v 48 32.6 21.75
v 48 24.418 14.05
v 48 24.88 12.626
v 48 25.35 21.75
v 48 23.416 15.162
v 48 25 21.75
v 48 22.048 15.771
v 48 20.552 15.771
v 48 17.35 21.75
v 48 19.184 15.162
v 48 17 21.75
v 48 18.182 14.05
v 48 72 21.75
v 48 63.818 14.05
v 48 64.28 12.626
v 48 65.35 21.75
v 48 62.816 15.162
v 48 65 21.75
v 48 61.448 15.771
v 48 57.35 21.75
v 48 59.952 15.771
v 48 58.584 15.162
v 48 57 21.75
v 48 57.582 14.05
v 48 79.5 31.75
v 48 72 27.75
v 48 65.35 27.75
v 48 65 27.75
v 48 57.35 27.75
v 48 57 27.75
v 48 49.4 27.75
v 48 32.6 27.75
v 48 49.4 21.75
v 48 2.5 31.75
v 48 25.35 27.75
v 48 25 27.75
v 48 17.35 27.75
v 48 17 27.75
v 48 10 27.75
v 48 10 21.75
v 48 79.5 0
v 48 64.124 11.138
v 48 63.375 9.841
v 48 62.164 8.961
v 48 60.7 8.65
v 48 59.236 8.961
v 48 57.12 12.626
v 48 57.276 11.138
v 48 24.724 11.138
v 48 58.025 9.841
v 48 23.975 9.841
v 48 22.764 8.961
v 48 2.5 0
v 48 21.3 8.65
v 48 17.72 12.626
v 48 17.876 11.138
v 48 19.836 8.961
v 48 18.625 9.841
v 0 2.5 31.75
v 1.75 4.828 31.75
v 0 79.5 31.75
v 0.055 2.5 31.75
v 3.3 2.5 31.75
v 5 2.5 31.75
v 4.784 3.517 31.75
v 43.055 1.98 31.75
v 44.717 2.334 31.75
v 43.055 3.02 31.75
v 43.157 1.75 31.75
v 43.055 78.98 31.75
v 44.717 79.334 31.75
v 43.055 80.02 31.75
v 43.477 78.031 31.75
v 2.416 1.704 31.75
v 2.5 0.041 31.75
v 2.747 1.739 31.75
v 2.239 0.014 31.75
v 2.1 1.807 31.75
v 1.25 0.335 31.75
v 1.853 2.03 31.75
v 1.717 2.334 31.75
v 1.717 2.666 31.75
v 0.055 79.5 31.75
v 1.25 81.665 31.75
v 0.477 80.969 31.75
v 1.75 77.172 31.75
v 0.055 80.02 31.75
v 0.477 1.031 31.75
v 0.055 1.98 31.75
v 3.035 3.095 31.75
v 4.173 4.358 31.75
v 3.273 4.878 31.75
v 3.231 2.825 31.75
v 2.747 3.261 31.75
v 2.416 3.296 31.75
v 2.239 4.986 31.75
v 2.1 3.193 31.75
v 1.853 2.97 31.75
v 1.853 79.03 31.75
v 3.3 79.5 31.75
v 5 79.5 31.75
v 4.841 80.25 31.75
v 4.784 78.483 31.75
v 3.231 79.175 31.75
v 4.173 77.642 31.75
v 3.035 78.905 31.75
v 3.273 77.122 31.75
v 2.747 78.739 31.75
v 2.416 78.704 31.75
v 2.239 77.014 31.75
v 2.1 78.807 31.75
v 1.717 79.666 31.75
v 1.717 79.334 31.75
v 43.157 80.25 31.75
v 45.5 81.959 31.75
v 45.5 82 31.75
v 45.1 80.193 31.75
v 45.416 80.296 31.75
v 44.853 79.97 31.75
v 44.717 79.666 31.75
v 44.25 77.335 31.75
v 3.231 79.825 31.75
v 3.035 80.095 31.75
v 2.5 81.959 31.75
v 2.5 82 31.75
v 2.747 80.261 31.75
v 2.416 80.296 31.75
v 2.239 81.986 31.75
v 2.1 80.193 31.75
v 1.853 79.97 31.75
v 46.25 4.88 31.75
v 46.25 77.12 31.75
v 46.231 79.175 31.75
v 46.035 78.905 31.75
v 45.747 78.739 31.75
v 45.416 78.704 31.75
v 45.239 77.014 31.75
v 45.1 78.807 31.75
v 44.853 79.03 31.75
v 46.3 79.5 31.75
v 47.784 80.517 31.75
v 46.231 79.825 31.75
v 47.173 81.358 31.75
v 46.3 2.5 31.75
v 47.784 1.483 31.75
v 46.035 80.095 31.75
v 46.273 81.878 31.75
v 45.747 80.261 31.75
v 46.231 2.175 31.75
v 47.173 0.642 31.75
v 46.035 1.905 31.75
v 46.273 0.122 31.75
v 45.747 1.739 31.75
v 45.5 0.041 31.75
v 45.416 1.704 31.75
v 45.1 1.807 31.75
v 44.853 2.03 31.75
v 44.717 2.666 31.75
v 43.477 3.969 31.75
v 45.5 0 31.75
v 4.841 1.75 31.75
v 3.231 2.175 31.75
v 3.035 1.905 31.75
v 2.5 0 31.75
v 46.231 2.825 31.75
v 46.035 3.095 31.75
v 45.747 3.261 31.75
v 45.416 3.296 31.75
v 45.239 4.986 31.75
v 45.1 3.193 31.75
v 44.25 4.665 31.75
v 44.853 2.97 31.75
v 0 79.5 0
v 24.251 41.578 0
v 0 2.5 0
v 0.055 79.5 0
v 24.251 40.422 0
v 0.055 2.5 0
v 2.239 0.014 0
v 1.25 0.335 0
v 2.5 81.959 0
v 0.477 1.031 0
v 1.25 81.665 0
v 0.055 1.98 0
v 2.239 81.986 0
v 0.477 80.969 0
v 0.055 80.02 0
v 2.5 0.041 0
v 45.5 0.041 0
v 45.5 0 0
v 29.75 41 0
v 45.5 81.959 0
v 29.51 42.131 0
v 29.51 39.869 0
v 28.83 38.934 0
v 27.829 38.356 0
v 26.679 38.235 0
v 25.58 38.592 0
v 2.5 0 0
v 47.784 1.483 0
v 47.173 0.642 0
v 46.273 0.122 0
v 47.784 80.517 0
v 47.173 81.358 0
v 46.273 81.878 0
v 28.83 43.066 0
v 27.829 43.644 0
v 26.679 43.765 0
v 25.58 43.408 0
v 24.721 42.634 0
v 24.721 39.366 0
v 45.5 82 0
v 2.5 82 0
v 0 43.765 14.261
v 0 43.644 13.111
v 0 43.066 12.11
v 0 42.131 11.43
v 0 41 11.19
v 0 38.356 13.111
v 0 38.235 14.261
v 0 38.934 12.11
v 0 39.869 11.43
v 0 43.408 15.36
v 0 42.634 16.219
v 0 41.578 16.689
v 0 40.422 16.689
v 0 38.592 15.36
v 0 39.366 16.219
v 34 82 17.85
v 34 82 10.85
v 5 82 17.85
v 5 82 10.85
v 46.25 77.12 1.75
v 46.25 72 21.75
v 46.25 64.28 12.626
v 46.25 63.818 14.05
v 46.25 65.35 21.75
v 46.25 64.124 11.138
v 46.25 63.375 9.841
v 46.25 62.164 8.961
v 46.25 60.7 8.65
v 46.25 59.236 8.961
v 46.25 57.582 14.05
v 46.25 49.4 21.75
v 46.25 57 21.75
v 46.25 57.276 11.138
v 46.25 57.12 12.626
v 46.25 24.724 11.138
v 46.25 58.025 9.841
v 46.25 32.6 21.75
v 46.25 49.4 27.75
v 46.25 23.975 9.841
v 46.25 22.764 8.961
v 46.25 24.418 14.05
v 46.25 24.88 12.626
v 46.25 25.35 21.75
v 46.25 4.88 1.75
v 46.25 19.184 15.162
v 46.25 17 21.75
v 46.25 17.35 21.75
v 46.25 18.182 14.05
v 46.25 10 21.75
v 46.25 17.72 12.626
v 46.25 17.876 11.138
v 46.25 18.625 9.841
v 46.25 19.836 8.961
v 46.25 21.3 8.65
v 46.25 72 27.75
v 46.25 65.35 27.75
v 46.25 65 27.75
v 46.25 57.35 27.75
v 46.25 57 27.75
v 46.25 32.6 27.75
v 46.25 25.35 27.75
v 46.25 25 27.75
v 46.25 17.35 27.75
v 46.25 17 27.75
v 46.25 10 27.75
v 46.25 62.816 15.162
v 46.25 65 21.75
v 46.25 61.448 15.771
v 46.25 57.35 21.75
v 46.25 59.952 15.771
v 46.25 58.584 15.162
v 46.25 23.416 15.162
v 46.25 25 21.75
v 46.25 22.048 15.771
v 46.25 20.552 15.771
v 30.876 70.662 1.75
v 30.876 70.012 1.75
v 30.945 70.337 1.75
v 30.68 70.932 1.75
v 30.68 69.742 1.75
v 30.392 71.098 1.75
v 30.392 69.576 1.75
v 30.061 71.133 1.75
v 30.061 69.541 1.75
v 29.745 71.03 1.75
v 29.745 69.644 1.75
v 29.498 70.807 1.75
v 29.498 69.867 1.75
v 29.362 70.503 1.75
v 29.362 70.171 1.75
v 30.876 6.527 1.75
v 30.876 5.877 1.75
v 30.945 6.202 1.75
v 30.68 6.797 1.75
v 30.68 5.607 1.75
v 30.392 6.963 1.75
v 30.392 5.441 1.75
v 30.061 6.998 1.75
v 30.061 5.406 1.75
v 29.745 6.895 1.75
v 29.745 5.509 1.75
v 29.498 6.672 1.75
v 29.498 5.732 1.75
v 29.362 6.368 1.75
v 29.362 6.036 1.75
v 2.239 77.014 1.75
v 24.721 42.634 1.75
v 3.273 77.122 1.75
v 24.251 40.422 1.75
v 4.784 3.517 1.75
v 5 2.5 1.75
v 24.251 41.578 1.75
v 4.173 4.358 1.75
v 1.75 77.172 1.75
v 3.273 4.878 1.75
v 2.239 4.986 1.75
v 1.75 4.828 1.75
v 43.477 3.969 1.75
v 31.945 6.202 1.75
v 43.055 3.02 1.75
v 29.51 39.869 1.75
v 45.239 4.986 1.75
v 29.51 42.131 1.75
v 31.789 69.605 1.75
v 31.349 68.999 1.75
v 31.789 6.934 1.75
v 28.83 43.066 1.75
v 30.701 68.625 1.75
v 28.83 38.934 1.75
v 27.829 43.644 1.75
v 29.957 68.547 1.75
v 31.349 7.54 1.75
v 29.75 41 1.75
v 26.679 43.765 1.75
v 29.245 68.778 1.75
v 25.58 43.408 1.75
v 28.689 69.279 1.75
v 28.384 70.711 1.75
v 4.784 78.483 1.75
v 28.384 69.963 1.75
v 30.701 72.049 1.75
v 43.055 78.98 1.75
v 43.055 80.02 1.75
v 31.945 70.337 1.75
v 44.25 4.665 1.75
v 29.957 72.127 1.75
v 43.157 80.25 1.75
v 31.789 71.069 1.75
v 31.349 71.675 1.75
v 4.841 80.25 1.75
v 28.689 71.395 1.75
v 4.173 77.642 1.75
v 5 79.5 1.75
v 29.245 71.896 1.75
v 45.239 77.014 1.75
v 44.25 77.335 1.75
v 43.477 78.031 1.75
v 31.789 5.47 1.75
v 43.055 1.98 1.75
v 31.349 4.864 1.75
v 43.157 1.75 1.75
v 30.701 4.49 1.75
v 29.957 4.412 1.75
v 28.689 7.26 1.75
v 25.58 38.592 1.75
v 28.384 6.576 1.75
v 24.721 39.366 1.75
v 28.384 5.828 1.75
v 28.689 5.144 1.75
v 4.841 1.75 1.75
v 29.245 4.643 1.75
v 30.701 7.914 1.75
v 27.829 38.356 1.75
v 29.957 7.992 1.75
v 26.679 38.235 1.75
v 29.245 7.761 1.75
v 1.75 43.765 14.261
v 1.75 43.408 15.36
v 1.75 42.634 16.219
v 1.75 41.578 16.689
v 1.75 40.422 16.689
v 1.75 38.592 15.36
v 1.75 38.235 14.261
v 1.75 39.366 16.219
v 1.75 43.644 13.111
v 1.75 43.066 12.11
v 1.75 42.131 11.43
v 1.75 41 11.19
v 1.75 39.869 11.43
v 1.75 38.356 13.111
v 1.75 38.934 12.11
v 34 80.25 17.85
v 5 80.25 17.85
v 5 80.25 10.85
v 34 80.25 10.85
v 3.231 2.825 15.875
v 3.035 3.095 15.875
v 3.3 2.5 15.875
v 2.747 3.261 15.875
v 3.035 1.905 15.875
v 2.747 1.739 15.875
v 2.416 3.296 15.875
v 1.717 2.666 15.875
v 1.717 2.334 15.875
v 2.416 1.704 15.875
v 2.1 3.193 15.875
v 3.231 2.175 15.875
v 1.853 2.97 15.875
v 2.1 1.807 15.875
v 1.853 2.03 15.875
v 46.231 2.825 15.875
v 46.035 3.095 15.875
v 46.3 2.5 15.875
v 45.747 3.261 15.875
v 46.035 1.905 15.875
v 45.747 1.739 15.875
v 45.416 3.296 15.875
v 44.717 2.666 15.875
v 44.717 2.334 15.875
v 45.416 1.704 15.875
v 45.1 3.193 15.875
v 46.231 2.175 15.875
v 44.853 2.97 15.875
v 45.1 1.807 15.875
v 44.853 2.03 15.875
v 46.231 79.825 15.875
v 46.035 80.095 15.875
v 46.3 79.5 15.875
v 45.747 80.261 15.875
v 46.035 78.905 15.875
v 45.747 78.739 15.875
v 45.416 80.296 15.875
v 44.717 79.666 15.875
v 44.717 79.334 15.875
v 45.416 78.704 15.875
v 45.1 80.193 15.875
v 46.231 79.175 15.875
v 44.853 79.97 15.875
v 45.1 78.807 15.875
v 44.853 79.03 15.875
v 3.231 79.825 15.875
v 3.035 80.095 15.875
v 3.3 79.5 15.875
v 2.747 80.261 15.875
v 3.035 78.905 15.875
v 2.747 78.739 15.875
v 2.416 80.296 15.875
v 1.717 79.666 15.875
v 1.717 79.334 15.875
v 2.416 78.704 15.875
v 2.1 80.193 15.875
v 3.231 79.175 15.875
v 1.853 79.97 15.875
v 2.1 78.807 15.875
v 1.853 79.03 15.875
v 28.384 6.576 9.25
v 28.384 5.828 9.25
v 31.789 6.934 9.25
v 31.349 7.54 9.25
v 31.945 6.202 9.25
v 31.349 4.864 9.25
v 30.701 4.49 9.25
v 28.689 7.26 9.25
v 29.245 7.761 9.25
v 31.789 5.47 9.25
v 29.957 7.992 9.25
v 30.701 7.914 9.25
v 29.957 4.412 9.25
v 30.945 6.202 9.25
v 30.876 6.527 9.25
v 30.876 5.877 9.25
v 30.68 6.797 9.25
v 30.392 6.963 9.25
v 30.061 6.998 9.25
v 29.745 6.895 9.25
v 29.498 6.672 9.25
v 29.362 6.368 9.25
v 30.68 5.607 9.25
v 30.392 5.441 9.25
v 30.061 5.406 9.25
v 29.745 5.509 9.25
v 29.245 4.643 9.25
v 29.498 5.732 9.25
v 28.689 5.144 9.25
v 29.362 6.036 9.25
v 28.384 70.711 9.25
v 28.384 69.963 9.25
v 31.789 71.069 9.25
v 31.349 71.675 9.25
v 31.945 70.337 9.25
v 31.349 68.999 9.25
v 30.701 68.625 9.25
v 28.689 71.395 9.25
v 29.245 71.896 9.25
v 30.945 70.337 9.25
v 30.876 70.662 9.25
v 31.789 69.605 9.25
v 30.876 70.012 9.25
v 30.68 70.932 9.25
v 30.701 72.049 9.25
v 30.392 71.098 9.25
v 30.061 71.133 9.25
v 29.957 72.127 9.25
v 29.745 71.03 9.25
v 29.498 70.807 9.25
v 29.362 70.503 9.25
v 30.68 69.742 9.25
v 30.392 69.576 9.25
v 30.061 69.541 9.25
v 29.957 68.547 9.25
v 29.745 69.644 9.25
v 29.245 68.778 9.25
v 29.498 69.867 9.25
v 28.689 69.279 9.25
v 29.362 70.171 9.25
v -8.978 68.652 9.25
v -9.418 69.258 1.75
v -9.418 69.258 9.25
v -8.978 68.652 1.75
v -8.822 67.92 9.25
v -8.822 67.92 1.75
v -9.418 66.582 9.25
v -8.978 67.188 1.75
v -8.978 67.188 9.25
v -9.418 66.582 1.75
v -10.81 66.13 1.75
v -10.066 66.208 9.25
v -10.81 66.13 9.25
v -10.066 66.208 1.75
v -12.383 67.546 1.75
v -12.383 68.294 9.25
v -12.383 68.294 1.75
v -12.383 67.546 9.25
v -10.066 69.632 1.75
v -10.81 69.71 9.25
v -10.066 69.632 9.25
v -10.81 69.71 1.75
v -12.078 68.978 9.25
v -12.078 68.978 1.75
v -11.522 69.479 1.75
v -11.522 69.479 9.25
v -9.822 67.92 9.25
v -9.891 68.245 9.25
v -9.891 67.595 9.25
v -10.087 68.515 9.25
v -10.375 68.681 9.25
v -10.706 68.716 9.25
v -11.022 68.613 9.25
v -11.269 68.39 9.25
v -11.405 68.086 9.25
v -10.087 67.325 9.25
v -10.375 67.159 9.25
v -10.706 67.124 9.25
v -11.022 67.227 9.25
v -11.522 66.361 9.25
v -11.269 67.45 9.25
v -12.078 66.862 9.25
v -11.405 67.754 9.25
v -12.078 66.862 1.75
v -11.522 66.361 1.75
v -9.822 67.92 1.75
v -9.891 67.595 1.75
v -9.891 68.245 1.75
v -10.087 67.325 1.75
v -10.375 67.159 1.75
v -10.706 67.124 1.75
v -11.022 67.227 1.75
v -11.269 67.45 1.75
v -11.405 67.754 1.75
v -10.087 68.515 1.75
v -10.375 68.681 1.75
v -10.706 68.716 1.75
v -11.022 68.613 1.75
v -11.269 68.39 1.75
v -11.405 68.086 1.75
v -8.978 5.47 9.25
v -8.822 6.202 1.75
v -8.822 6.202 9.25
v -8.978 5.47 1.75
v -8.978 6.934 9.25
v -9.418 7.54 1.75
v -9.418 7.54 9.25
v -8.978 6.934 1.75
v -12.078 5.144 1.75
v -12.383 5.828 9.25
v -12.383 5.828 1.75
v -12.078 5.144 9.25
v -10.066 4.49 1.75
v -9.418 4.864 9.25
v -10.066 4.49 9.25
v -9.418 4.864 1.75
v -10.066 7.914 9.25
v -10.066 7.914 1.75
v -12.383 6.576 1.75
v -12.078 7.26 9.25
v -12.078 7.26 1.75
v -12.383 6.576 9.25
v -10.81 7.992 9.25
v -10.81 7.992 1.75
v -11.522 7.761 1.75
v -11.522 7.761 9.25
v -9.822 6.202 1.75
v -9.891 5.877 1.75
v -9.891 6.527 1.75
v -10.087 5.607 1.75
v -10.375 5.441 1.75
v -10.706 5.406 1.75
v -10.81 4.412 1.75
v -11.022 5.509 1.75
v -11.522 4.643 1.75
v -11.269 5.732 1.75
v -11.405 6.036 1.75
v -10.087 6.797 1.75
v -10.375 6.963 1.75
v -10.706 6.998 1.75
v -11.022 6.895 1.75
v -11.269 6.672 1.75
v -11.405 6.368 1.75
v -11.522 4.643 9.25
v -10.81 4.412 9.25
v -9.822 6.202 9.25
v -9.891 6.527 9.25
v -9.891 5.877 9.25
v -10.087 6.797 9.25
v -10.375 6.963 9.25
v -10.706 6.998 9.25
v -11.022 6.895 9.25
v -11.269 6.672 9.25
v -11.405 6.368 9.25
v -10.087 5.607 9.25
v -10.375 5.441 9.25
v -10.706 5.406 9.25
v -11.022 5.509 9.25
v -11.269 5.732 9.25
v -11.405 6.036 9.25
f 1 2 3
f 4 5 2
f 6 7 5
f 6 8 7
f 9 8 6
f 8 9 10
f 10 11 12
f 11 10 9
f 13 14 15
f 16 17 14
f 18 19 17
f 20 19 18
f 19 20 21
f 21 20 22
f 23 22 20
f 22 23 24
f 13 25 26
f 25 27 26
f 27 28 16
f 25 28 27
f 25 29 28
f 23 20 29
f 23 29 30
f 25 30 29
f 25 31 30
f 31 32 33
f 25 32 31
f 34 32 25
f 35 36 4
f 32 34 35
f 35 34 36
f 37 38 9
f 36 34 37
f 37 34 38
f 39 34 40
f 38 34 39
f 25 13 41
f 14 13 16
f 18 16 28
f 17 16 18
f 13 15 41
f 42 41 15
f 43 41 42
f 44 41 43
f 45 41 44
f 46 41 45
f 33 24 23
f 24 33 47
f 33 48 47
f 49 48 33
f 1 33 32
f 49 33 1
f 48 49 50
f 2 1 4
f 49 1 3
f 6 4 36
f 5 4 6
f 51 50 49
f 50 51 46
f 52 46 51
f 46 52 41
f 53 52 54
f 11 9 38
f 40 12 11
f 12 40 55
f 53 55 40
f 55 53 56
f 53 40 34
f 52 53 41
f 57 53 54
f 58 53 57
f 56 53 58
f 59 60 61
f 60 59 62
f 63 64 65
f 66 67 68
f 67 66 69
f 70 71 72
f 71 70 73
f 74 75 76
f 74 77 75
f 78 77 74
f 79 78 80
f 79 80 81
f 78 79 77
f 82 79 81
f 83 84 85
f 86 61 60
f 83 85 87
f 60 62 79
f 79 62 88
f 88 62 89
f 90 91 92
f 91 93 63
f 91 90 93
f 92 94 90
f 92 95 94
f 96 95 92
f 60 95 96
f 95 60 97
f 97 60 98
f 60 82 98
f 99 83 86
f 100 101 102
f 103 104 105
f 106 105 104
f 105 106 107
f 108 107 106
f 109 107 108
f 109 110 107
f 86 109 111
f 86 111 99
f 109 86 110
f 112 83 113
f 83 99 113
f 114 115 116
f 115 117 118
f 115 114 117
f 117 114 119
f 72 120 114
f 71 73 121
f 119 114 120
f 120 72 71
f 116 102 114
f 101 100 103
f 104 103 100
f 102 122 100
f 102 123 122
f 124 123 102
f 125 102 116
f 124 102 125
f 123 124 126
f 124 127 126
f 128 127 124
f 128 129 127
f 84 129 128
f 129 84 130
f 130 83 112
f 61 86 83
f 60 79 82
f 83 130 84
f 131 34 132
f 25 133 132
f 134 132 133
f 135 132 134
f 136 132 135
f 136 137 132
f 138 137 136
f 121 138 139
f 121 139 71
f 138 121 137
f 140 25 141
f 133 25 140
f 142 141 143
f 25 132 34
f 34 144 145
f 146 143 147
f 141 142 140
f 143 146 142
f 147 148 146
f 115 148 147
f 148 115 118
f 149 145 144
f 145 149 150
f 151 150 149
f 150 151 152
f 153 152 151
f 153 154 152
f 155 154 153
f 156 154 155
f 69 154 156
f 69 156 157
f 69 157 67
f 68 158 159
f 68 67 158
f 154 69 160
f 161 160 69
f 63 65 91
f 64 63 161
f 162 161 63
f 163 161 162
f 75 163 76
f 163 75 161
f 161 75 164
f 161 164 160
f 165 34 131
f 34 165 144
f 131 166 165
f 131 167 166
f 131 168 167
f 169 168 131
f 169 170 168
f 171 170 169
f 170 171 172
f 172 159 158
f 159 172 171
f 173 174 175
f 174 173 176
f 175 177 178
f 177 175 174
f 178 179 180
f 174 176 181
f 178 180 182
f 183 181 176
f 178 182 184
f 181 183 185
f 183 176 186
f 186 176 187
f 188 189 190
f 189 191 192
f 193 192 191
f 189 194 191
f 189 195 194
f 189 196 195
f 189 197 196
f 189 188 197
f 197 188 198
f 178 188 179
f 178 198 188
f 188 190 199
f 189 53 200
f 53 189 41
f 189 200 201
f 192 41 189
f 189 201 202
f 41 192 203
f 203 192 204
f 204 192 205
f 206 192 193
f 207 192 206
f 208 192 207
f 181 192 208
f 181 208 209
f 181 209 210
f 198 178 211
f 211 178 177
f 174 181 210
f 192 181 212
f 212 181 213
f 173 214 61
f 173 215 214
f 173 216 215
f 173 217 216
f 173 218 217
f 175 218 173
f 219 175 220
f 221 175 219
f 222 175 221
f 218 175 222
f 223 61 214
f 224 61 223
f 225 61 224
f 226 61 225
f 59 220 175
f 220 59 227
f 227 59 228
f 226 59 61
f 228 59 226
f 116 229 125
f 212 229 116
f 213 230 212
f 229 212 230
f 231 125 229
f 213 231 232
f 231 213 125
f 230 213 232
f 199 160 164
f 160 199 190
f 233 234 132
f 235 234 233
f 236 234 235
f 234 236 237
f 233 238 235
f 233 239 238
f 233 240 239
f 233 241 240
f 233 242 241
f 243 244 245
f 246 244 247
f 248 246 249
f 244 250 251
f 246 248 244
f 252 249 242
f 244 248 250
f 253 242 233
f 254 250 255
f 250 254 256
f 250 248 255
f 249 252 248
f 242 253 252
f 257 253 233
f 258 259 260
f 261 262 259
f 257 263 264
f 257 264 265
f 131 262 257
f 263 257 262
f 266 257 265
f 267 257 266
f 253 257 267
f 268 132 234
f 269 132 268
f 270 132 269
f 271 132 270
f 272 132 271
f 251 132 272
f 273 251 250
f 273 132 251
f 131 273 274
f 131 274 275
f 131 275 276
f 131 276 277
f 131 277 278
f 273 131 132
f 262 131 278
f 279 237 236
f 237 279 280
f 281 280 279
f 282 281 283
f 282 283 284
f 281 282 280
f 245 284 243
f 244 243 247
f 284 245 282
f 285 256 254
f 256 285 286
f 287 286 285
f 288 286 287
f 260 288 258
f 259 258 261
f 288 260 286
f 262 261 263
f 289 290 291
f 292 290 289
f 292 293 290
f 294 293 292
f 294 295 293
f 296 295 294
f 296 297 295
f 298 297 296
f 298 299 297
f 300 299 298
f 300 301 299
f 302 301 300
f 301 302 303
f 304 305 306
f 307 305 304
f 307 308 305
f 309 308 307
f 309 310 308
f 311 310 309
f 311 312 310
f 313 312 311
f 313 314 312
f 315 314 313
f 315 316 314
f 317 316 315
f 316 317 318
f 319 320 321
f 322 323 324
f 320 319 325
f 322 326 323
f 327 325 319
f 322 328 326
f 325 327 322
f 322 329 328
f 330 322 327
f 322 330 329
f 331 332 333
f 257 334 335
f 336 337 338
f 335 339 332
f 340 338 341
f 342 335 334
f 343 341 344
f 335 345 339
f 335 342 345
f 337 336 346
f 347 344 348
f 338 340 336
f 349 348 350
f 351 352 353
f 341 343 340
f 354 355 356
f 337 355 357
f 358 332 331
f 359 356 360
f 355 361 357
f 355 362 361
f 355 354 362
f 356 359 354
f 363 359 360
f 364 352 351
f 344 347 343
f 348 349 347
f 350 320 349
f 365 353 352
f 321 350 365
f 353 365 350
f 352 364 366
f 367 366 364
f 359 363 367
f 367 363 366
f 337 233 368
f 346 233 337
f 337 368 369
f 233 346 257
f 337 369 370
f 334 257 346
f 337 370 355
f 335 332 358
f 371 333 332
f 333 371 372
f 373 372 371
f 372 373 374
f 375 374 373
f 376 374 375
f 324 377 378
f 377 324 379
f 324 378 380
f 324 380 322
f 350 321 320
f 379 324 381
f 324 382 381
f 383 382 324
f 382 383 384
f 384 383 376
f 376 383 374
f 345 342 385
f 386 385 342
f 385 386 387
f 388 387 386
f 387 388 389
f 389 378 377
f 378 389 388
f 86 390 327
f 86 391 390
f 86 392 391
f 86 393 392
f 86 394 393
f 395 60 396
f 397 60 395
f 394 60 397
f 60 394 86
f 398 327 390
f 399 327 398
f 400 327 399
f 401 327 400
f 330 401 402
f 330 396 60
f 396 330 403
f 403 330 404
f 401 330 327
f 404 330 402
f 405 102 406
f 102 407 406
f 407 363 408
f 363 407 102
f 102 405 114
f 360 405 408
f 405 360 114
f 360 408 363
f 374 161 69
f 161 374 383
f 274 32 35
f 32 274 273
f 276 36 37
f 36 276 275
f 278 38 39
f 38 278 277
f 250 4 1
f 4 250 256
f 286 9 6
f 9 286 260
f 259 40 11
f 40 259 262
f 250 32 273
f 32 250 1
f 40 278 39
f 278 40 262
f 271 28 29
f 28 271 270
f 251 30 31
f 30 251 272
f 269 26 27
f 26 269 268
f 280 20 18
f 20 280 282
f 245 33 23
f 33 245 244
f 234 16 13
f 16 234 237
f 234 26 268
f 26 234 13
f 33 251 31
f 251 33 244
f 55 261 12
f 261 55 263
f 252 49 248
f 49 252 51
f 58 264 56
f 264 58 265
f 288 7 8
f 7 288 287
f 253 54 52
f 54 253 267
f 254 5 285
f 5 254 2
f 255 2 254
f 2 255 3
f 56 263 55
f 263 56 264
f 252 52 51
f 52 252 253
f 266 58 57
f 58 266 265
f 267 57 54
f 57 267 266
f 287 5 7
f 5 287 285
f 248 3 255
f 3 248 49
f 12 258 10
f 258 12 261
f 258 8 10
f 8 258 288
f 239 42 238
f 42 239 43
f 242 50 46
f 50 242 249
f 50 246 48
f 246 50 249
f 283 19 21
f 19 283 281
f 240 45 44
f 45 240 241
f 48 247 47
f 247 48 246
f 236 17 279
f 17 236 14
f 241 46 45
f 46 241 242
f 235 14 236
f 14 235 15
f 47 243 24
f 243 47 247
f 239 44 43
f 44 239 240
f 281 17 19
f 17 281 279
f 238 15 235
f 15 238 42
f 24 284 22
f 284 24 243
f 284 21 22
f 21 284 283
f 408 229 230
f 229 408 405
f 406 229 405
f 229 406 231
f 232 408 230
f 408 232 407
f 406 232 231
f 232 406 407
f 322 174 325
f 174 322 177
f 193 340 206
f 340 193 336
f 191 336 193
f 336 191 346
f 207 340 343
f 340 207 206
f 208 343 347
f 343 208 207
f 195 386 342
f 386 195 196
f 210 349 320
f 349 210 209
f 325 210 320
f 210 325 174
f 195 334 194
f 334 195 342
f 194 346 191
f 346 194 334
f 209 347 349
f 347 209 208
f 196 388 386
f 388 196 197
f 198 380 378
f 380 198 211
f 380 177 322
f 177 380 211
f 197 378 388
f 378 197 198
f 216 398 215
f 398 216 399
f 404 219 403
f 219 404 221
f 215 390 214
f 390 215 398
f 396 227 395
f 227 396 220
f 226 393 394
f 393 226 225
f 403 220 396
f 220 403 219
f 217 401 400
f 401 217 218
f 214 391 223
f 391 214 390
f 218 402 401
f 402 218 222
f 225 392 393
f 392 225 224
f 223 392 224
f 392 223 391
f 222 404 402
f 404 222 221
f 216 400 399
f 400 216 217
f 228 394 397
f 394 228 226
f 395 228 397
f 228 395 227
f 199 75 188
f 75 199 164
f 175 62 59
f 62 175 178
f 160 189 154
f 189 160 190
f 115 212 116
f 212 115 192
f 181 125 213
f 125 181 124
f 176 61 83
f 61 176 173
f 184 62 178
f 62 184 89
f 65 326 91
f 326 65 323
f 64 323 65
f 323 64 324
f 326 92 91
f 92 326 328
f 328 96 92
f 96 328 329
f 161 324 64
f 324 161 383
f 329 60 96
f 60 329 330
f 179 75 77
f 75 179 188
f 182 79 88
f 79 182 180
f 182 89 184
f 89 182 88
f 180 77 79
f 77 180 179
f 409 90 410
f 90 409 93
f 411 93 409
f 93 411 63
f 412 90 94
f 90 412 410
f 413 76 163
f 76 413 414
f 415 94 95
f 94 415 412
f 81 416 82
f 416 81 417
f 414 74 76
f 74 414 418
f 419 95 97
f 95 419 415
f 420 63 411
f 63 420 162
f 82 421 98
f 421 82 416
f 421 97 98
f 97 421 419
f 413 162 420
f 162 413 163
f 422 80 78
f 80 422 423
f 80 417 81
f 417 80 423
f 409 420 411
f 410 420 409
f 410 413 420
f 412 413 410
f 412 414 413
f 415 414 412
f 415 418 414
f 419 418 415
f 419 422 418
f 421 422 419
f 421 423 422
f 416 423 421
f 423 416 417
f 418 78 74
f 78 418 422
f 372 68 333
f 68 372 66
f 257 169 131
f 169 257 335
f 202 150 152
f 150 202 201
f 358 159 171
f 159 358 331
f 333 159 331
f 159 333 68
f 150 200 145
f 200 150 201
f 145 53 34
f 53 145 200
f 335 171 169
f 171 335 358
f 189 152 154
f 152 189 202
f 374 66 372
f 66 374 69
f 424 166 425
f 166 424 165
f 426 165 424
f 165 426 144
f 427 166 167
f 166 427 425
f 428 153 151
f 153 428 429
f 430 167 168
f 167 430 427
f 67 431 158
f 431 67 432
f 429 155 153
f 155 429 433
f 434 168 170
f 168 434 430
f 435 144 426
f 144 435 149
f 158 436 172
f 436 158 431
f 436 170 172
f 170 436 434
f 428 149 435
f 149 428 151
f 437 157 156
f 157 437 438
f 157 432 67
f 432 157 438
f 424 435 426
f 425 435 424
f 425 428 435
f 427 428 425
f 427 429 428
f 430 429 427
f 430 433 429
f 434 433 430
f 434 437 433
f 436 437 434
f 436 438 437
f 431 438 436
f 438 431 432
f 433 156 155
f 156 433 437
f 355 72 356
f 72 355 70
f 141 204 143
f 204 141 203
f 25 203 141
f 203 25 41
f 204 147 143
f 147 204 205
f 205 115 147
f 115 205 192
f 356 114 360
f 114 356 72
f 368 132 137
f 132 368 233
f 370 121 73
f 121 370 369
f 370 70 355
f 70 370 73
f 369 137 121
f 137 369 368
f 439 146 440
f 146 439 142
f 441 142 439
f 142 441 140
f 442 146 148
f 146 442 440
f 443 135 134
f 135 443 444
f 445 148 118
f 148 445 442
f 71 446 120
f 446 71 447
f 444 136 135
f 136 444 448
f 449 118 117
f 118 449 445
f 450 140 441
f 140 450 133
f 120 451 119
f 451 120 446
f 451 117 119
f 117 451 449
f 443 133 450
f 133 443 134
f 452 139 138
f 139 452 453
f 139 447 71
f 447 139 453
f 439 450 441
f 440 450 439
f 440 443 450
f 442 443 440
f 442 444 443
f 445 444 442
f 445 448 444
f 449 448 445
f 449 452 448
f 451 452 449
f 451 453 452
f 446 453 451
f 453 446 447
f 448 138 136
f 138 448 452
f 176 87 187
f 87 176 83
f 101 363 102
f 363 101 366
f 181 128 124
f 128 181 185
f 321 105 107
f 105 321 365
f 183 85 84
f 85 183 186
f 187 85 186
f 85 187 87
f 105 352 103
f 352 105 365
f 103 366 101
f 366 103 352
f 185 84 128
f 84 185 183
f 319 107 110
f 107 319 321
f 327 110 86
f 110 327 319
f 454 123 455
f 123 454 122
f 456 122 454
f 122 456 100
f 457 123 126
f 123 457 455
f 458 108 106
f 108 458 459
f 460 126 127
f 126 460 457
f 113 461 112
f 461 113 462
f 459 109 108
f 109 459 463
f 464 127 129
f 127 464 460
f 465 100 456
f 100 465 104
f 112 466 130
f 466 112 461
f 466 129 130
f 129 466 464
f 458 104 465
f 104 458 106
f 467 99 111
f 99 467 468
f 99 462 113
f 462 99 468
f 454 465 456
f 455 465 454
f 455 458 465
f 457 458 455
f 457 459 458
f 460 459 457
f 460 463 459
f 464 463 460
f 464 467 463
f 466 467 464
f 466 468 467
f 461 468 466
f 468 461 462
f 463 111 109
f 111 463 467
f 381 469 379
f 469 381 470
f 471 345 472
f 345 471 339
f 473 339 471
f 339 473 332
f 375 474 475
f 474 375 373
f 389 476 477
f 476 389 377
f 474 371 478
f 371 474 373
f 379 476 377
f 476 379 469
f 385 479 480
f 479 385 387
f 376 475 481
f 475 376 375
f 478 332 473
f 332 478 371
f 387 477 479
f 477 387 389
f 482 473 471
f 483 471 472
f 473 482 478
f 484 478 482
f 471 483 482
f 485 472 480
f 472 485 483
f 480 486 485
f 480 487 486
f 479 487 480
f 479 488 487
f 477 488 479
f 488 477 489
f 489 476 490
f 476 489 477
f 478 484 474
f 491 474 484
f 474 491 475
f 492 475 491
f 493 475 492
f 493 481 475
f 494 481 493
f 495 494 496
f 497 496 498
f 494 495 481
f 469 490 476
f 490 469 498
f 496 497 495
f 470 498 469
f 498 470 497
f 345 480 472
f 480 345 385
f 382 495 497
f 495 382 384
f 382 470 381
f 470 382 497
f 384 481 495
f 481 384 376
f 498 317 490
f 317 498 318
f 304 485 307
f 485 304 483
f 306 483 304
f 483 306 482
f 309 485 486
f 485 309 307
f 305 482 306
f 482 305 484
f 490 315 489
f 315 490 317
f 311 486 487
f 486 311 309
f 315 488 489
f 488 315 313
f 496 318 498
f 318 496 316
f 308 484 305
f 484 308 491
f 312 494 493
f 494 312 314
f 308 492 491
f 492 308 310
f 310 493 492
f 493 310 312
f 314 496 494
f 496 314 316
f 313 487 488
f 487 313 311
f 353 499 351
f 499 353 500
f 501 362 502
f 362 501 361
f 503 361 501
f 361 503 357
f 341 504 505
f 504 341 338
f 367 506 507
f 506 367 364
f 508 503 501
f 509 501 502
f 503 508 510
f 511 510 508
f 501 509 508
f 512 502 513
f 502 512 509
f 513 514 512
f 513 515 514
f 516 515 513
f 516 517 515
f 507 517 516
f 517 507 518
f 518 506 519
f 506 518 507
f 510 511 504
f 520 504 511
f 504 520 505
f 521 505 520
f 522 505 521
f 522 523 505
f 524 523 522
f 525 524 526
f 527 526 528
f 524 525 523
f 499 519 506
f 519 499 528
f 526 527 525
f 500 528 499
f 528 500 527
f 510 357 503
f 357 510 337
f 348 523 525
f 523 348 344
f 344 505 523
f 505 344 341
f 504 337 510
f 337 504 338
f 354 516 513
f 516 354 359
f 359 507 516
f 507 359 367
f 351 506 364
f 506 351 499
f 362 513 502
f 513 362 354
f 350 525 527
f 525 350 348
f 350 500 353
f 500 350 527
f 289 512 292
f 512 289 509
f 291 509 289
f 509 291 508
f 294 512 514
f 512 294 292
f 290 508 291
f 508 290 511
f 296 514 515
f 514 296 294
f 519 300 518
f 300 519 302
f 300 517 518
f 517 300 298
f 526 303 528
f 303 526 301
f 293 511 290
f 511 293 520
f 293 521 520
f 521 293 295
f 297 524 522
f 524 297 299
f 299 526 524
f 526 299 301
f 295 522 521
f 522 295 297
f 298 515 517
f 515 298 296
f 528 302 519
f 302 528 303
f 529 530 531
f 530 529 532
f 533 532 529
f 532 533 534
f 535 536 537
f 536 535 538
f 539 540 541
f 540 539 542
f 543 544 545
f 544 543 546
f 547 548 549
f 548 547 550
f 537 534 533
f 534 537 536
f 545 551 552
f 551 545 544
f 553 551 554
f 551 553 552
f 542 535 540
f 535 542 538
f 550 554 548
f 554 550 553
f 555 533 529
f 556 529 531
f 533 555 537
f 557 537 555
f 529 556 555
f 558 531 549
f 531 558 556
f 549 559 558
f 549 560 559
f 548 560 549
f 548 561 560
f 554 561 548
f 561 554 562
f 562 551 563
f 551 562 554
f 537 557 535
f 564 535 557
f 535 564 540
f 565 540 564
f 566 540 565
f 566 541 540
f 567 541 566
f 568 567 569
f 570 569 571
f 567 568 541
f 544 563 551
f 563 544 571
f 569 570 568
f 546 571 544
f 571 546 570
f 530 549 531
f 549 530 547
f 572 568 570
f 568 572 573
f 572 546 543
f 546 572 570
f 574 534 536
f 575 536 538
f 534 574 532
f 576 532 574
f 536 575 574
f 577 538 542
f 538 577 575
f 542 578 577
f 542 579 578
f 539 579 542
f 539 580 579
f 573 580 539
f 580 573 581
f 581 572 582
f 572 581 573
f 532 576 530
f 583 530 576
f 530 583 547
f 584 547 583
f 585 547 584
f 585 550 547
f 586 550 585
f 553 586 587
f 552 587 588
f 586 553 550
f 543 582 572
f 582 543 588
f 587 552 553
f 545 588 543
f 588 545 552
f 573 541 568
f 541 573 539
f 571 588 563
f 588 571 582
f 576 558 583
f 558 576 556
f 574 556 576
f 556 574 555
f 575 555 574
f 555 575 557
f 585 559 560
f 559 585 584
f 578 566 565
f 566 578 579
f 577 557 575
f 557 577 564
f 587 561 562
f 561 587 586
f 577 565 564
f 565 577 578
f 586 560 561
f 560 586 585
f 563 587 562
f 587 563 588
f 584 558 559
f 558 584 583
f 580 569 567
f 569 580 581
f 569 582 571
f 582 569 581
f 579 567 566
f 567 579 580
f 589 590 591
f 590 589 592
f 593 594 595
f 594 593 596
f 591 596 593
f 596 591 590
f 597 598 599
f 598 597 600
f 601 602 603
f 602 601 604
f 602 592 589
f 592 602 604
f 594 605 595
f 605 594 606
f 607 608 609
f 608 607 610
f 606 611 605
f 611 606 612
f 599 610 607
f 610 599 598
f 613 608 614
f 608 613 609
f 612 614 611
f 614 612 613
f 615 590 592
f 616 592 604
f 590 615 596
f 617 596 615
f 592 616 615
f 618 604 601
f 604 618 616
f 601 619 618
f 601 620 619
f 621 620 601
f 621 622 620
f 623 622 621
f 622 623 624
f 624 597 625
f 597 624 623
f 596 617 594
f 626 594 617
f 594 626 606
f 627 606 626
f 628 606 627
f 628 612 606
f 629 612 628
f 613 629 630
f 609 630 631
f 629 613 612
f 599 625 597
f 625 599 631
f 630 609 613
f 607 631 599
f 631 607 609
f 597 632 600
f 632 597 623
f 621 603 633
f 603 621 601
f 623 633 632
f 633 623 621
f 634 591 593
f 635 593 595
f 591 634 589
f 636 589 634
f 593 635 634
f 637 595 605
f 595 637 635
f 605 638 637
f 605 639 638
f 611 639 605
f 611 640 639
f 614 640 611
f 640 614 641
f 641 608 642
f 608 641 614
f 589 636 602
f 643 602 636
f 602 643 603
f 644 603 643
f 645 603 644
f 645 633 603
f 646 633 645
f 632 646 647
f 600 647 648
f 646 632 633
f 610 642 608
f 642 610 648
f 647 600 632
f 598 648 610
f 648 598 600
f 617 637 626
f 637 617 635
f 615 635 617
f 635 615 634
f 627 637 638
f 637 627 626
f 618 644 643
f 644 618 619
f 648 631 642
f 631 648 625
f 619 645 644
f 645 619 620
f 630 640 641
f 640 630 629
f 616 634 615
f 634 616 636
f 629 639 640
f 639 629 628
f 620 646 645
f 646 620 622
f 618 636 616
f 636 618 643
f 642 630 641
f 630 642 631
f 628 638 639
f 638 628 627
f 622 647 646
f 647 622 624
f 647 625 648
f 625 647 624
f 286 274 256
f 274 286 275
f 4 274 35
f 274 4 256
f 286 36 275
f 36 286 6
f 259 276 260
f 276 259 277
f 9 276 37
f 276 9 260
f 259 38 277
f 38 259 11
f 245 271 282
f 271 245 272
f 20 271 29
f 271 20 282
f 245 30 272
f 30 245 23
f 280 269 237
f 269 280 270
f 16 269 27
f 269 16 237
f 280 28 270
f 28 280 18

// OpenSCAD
//everything is in units of millimeters
resolution = 0.35;

//variables to keep in-sync with the other scad file
mainShellThickness = 5 * resolution;
mainDepth = 48;
mainWidth = 82;
mainHeight = 30 + mainShellThickness;
screwCylinderRadius = 2.5;
screwHoleCylinderRadius = 0.8;
screwHoleCylinderOffsetFromFloor = mainHeight / 2;
cylinderFragments = 15; //TODO 70;

displayWidth = 22.6;
displayDepth = mainShellThickness;
displayHeight = 6;
displayYOffset = 8.4;
displayTopOffset = displayHeight + 4;
knobHoleYoffset = (mainWidth / 2) - displayYOffset - (displayWidth / 2);
knobHoleZoffset = mainHeight - displayTopOffset - 9.5;
knobHoleRadius = 3.6;
knobHoleDepth = mainShellThickness;
knobScrewHoleYoffset = 9;
knobScrewBottomHoleZoffset = 6;
knobScrewTopHoleZoffset = 11;
knobScrewHoleRadius = 1.6;
knobSupportWallThickness = resolution * 2;
knobSupportWidth = 12 + 2 * knobSupportWallThickness;
knobSupportHeight = 12.3 + 2 * knobSupportWallThickness;
knobSupportDepth = 2;
mountingHoleRadius = 2.78;
mountingHoleX = mainDepth - mainShellThickness - mountingHoleRadius - 16.5;
pcbScrewMountHeight = 7.5;
pcbScrewCylinderRadius = 1.8;
pcbScrewHoleCylinderRadius = 0.8;
pcbBoardThickness = 1.6;
pcbOffsetFromFront = 19;
usbSlotWidth = 29;
usbSlotHeight = 7;
usbSlotYoffset = pcbScrewMountHeight + pcbBoardThickness;


union() {
  difference() {
    //main shell
    cube([mainDepth, mainWidth, mainHeight]);
    translate([mainShellThickness, mainShellThickness, mainShellThickness]) {//cut-out inside
      cube([mainDepth - mainShellThickness * 2, mainWidth - mainShellThickness * 2, mainHeight]);
    };
    
    //left display
    translate([mainDepth - displayDepth, mainWidth/2 - displayWidth - displayYOffset, mainHeight - displayTopOffset]) {
      cube([displayDepth,displayWidth,displayHeight]);
    };
    
    //right display
    translate([mainDepth - displayDepth, mainWidth/2 + displayYOffset, mainHeight - displayTopOffset]) {
      cube([displayDepth,displayWidth,displayHeight]);
    };
    
    //left knob
    translate([mainDepth - knobHoleDepth, knobHoleYoffset, knobHoleZoffset]) {
      rotate([0,90,0]) {
        cylinder(knobHoleDepth,knobHoleRadius,knobHoleRadius,$fn=cylinderFragments);
      };
    };
    
    //right knob
    translate([mainDepth - knobHoleDepth, mainWidth - knobHoleYoffset, knobHoleZoffset]) {
      rotate([0,90,0]) {
        cylinder(knobHoleDepth,knobHoleRadius,knobHoleRadius,$fn=cylinderFragments);
      };
    };
    
    //usb cable slot right side
    translate([screwCylinderRadius * 2, mainWidth - mainShellThickness, mainShellThickness + usbSlotYoffset]) {
      cube([usbSlotWidth, mainShellThickness, usbSlotHeight]);
    };
    
    //bottom mounting hole
    translate([mountingHoleX, mainWidth/2, 0]) {
      cylinder(mainShellThickness, mountingHoleRadius, mountingHoleRadius, $fn=cylinderFragments);
    };
    
    //back mounting hole
    translate([0, mainWidth/2, mainHeight - mountingHoleRadius - 15]) {
      rotate([0,90,0]) {
        cylinder(mainShellThickness, mountingHoleRadius, mountingHoleRadius, $fn=cylinderFragments);
      };
    };
    
    //cut out for case lid screw mounts and rounded edges, rear-left
    translate([0, 0, 0]) {
      cube([screwCylinderRadius, screwCylinderRadius, mainHeight]);
    };
    translate([screwCylinderRadius - screwHoleCylinderRadius, screwCylinderRadius - screwHoleCylinderRadius, mainShellThickness]) {
      cube([screwHoleCylinderRadius*2, screwHoleCylinderRadius*2, mainHeight - mainShellThickness]);
    };
    
    //cut out for case lid screw mounts and rounded edges, front-left
    translate([mainDepth - screwCylinderRadius, 0, 0]) {
      cube([screwCylinderRadius, screwCylinderRadius, mainHeight]);
    };
    translate([mainDepth - screwCylinderRadius - screwHoleCylinderRadius, screwCylinderRadius - screwHoleCylinderRadius, mainShellThickness]) {
      cube([screwHoleCylinderRadius*2, screwHoleCylinderRadius*2, mainHeight - mainShellThickness]);
    };
    
    //cut out for case lid screw mounts and rounded edges, front-right
    translate([mainDepth - screwCylinderRadius, mainWidth - screwCylinderRadius, 0]) {
      cube([screwCylinderRadius, screwCylinderRadius, mainHeight]);
    };
    translate([mainDepth - screwCylinderRadius - screwHoleCylinderRadius, mainWidth - screwCylinderRadius - screwHoleCylinderRadius, mainShellThickness]) {
      cube([screwHoleCylinderRadius*2, screwHoleCylinderRadius*2, mainHeight - mainShellThickness]);
    };
    
    //cut out for case lid screw mounts and rounded edges, rear-right
    translate([0, mainWidth - screwCylinderRadius, 0]) {
      cube([screwCylinderRadius, screwCylinderRadius, mainHeight]);
    };
    translate([screwCylinderRadius - screwHoleCylinderRadius, mainWidth - screwCylinderRadius - screwHoleCylinderRadius, mainShellThickness]) {
      cube([screwHoleCylinderRadius*2, screwHoleCylinderRadius*2, mainHeight - mainShellThickness]);
    };
  };
  
  //adding cylinder for case lid screw mounts, rear-left
  difference() {
    translate([screwCylinderRadius, screwCylinderRadius, 0]) {
      cylinder(mainHeight, screwCylinderRadius, screwCylinderRadius, $fn=cylinderFragments);
    };
    translate([screwCylinderRadius, screwCylinderRadius, screwHoleCylinderOffsetFromFloor]) {
      cylinder(mainHeight - screwHoleCylinderOffsetFromFloor, screwHoleCylinderRadius, screwHoleCylinderRadius, $fn=cylinderFragments);
    }
  };

  //adding cylinder for case lid screw mounts, front-left
  difference() {
    translate([mainDepth - screwCylinderRadius, screwCylinderRadius, 0]) {
      cylinder(mainHeight, screwCylinderRadius, screwCylinderRadius, $fn=cylinderFragments);
    };
    translate([mainDepth - screwCylinderRadius, screwCylinderRadius, screwHoleCylinderOffsetFromFloor]) {
      cylinder(mainHeight - screwHoleCylinderOffsetFromFloor, screwHoleCylinderRadius, screwHoleCylinderRadius, $fn=cylinderFragments);
    }
  };
  
  //adding cylinder for case lid screw mounts, front-right
  difference() {
    translate([mainDepth - screwCylinderRadius, mainWidth - screwCylinderRadius, 0]) {
      cylinder(mainHeight, screwCylinderRadius, screwCylinderRadius, $fn=cylinderFragments);
    };
    translate([mainDepth - screwCylinderRadius, mainWidth - screwCylinderRadius, screwHoleCylinderOffsetFromFloor]) {
      cylinder(mainHeight - screwHoleCylinderOffsetFromFloor, screwHoleCylinderRadius, screwHoleCylinderRadius, $fn=cylinderFragments);
    }
  };
  
  //adding cylinder for case lid screw mounts, rear-right
  difference() {
    translate([screwCylinderRadius, mainWidth - screwCylinderRadius, 0]) {
      cylinder(mainHeight, screwCylinderRadius, screwCylinderRadius, $fn=cylinderFragments);
    };
    translate([screwCylinderRadius, mainWidth - screwCylinderRadius, screwHoleCylinderOffsetFromFloor]) {
      cylinder(mainHeight - screwHoleCylinderOffsetFromFloor, screwHoleCylinderRadius, screwHoleCylinderRadius, $fn=cylinderFragments);
    }
  };
  
  //display "jail bar" support for 3D plastic printing process
  translate([mainDepth - mainShellThickness, mainWidth/2 - 16, mainHeight - displayTopOffset]) {
    cube([mainShellThickness, resolution, displayHeight]);
  };
  translate([mainDepth - mainShellThickness, mainWidth/2 - 24, mainHeight - displayTopOffset]) {
    cube([mainShellThickness, resolution, displayHeight]);
  };
  translate([mainDepth - mainShellThickness, mainWidth/2 + 16, mainHeight - displayTopOffset]) {
    cube([mainShellThickness, resolution, displayHeight]);
  };
  translate([mainDepth - mainShellThickness, mainWidth/2 + 24, mainHeight - displayTopOffset]) {
    cube([mainShellThickness, resolution, displayHeight]);
  };
  
  
  //PCB left-front side screw/mount
  difference() {
    translate([mountingHoleX + 3.175, mainWidth/2 - 34.798, mainShellThickness]) {
      cylinder(pcbScrewMountHeight, pcbScrewCylinderRadius, pcbScrewCylinderRadius, $fn=cylinderFragments);
    };
    translate([mountingHoleX + 3.175, mainWidth/2 - 34.798, mainShellThickness]) {
      cylinder(pcbScrewMountHeight, pcbScrewHoleCylinderRadius, pcbScrewHoleCylinderRadius, $fn=cylinderFragments);
    };
  };
  
  //PCB right-front side screw/mount
  difference() {
    translate([mountingHoleX + 3.175, mainWidth/2 + 29.337, mainShellThickness]) {
      cylinder(pcbScrewMountHeight, pcbScrewCylinderRadius, pcbScrewCylinderRadius, $fn=cylinderFragments);
    };
    translate([mountingHoleX + 3.175, mainWidth/2 + 29.337, mainShellThickness]) {
      cylinder(pcbScrewMountHeight, pcbScrewHoleCylinderRadius, pcbScrewHoleCylinderRadius, $fn=cylinderFragments);
    };
  };
  
  //PCB right-rear side screw/mount
  difference() {
    translate([mountingHoleX - 37.592, mainWidth/2 + 26.92, mainShellThickness]) {
      cylinder(pcbScrewMountHeight, pcbScrewCylinderRadius, pcbScrewCylinderRadius, $fn=cylinderFragments);
    };
    translate([mountingHoleX - 37.592, mainWidth/2 + 26.92, mainShellThickness]) {
      cylinder(pcbScrewMountHeight, pcbScrewHoleCylinderRadius, pcbScrewHoleCylinderRadius, $fn=cylinderFragments);
    };
  };
  
  //PCB left-rear side screw/mount
  difference() {
    translate([mountingHoleX - 37.592, mainWidth/2 - 34.798, mainShellThickness]) {
      cylinder(pcbScrewMountHeight, pcbScrewCylinderRadius, pcbScrewCylinderRadius, $fn=cylinderFragments);
    };
    translate([mountingHoleX - 37.592, mainWidth/2 - 34.798, mainShellThickness]) {
      cylinder(pcbScrewMountHeight, pcbScrewHoleCylinderRadius, pcbScrewHoleCylinderRadius, $fn=cylinderFragments);
    };
  };
  
  
  /*chunky 1700mAh battery
   *https://amzn.to/38PP5lB
   *volume 15142.4 cubic millimeters*/
  /*translate([mainShellThickness + 1, mainShellThickness + 1, mainShellThickness + 1]) {
    cube([28, 52, 10.4]);
  };*/
  
  /*1000 mAh battery item A
   *https://amzn.to/3iOChR7
   *volume 9360 cubic millimeters*/
  /*translate([mainShellThickness + 5, mainShellThickness + 5, mainShellThickness + 5]) {
    cube([7.8, 40, 30]);
  };*/
  
  /*1000 mAh battery item B
   *https://amzn.to/2WaNbad
   *volume 10000 cubic millimeters
   ***candidate****/
  /*translate([mainShellThickness + 1, mainShellThickness + 3.3, mainShellThickness + 0.5]) {
    cube([20, 50, 10]);
  };*/
  
  /*1000 mAh battery item C
   *https://amzn.to/3ekTApi
   *volume 9016.8 cubic millimeters*/
  /*translate([mainShellThickness + 5, mainShellThickness + 5, mainShellThickness + 5]) {
    cube([5.1, 52, 34]);
  };*/
  
  /*750 mAh battery item D
   *https://amzn.to/2APc0AP
   *volume 8252.4 cubic millimeters*/
  /*translate([mainShellThickness + 5, mainShellThickness + 5, mainShellThickness + 5]) {
    cube([7.8, 46, 23]);
  };*/
  
  /*750 mAh battery flat item E
   *https://amzn.to/3egqKGE
   *volume 7500 cubic millimeters*/
  /*translate([mainShellThickness + 1, mainShellThickness + 5, mainShellThickness + 5]) {
    cube([30, 50, 5]);
  };*/
  
  /*750 mAh battery flat item F
   *https://amzn.to/2C5dhnX
   *volume 9360 cubic millimeters*/
  /*translate([mainShellThickness + 5, mainShellThickness + 5, mainShellThickness + 5]) {
    cube([7.8, 40, 30]);
  };*/
  
  //left rotary knob approximation for installation
  /*translate([mainDepth - mainShellThickness - 33, mainShellThickness + 8, mainShellThickness + 6]) {
    cube([33, 26, 19.5]);
  };*/
  //left rotary knob approximation post installation
  /*translate([mainDepth - mainShellThickness - 15, mainShellThickness + 8, mainShellThickness + 6]) {
    cube([33, 26, 19.5]);
  };*/
  
  //right rotary knob approximation for installation
  /*translate([mainDepth - mainShellThickness - 33, mainShellThickness + 47.5, mainShellThickness + 6]) {
    cube([33, 26, 19.5]);
  };*/
  //right rotary knob approximation post installation
  /*translate([mainDepth - mainShellThickness - 15, mainShellThickness + 47.5, mainShellThickness + 6]) {
    cube([33, 26, 19.5]);
  };*/
};
  
